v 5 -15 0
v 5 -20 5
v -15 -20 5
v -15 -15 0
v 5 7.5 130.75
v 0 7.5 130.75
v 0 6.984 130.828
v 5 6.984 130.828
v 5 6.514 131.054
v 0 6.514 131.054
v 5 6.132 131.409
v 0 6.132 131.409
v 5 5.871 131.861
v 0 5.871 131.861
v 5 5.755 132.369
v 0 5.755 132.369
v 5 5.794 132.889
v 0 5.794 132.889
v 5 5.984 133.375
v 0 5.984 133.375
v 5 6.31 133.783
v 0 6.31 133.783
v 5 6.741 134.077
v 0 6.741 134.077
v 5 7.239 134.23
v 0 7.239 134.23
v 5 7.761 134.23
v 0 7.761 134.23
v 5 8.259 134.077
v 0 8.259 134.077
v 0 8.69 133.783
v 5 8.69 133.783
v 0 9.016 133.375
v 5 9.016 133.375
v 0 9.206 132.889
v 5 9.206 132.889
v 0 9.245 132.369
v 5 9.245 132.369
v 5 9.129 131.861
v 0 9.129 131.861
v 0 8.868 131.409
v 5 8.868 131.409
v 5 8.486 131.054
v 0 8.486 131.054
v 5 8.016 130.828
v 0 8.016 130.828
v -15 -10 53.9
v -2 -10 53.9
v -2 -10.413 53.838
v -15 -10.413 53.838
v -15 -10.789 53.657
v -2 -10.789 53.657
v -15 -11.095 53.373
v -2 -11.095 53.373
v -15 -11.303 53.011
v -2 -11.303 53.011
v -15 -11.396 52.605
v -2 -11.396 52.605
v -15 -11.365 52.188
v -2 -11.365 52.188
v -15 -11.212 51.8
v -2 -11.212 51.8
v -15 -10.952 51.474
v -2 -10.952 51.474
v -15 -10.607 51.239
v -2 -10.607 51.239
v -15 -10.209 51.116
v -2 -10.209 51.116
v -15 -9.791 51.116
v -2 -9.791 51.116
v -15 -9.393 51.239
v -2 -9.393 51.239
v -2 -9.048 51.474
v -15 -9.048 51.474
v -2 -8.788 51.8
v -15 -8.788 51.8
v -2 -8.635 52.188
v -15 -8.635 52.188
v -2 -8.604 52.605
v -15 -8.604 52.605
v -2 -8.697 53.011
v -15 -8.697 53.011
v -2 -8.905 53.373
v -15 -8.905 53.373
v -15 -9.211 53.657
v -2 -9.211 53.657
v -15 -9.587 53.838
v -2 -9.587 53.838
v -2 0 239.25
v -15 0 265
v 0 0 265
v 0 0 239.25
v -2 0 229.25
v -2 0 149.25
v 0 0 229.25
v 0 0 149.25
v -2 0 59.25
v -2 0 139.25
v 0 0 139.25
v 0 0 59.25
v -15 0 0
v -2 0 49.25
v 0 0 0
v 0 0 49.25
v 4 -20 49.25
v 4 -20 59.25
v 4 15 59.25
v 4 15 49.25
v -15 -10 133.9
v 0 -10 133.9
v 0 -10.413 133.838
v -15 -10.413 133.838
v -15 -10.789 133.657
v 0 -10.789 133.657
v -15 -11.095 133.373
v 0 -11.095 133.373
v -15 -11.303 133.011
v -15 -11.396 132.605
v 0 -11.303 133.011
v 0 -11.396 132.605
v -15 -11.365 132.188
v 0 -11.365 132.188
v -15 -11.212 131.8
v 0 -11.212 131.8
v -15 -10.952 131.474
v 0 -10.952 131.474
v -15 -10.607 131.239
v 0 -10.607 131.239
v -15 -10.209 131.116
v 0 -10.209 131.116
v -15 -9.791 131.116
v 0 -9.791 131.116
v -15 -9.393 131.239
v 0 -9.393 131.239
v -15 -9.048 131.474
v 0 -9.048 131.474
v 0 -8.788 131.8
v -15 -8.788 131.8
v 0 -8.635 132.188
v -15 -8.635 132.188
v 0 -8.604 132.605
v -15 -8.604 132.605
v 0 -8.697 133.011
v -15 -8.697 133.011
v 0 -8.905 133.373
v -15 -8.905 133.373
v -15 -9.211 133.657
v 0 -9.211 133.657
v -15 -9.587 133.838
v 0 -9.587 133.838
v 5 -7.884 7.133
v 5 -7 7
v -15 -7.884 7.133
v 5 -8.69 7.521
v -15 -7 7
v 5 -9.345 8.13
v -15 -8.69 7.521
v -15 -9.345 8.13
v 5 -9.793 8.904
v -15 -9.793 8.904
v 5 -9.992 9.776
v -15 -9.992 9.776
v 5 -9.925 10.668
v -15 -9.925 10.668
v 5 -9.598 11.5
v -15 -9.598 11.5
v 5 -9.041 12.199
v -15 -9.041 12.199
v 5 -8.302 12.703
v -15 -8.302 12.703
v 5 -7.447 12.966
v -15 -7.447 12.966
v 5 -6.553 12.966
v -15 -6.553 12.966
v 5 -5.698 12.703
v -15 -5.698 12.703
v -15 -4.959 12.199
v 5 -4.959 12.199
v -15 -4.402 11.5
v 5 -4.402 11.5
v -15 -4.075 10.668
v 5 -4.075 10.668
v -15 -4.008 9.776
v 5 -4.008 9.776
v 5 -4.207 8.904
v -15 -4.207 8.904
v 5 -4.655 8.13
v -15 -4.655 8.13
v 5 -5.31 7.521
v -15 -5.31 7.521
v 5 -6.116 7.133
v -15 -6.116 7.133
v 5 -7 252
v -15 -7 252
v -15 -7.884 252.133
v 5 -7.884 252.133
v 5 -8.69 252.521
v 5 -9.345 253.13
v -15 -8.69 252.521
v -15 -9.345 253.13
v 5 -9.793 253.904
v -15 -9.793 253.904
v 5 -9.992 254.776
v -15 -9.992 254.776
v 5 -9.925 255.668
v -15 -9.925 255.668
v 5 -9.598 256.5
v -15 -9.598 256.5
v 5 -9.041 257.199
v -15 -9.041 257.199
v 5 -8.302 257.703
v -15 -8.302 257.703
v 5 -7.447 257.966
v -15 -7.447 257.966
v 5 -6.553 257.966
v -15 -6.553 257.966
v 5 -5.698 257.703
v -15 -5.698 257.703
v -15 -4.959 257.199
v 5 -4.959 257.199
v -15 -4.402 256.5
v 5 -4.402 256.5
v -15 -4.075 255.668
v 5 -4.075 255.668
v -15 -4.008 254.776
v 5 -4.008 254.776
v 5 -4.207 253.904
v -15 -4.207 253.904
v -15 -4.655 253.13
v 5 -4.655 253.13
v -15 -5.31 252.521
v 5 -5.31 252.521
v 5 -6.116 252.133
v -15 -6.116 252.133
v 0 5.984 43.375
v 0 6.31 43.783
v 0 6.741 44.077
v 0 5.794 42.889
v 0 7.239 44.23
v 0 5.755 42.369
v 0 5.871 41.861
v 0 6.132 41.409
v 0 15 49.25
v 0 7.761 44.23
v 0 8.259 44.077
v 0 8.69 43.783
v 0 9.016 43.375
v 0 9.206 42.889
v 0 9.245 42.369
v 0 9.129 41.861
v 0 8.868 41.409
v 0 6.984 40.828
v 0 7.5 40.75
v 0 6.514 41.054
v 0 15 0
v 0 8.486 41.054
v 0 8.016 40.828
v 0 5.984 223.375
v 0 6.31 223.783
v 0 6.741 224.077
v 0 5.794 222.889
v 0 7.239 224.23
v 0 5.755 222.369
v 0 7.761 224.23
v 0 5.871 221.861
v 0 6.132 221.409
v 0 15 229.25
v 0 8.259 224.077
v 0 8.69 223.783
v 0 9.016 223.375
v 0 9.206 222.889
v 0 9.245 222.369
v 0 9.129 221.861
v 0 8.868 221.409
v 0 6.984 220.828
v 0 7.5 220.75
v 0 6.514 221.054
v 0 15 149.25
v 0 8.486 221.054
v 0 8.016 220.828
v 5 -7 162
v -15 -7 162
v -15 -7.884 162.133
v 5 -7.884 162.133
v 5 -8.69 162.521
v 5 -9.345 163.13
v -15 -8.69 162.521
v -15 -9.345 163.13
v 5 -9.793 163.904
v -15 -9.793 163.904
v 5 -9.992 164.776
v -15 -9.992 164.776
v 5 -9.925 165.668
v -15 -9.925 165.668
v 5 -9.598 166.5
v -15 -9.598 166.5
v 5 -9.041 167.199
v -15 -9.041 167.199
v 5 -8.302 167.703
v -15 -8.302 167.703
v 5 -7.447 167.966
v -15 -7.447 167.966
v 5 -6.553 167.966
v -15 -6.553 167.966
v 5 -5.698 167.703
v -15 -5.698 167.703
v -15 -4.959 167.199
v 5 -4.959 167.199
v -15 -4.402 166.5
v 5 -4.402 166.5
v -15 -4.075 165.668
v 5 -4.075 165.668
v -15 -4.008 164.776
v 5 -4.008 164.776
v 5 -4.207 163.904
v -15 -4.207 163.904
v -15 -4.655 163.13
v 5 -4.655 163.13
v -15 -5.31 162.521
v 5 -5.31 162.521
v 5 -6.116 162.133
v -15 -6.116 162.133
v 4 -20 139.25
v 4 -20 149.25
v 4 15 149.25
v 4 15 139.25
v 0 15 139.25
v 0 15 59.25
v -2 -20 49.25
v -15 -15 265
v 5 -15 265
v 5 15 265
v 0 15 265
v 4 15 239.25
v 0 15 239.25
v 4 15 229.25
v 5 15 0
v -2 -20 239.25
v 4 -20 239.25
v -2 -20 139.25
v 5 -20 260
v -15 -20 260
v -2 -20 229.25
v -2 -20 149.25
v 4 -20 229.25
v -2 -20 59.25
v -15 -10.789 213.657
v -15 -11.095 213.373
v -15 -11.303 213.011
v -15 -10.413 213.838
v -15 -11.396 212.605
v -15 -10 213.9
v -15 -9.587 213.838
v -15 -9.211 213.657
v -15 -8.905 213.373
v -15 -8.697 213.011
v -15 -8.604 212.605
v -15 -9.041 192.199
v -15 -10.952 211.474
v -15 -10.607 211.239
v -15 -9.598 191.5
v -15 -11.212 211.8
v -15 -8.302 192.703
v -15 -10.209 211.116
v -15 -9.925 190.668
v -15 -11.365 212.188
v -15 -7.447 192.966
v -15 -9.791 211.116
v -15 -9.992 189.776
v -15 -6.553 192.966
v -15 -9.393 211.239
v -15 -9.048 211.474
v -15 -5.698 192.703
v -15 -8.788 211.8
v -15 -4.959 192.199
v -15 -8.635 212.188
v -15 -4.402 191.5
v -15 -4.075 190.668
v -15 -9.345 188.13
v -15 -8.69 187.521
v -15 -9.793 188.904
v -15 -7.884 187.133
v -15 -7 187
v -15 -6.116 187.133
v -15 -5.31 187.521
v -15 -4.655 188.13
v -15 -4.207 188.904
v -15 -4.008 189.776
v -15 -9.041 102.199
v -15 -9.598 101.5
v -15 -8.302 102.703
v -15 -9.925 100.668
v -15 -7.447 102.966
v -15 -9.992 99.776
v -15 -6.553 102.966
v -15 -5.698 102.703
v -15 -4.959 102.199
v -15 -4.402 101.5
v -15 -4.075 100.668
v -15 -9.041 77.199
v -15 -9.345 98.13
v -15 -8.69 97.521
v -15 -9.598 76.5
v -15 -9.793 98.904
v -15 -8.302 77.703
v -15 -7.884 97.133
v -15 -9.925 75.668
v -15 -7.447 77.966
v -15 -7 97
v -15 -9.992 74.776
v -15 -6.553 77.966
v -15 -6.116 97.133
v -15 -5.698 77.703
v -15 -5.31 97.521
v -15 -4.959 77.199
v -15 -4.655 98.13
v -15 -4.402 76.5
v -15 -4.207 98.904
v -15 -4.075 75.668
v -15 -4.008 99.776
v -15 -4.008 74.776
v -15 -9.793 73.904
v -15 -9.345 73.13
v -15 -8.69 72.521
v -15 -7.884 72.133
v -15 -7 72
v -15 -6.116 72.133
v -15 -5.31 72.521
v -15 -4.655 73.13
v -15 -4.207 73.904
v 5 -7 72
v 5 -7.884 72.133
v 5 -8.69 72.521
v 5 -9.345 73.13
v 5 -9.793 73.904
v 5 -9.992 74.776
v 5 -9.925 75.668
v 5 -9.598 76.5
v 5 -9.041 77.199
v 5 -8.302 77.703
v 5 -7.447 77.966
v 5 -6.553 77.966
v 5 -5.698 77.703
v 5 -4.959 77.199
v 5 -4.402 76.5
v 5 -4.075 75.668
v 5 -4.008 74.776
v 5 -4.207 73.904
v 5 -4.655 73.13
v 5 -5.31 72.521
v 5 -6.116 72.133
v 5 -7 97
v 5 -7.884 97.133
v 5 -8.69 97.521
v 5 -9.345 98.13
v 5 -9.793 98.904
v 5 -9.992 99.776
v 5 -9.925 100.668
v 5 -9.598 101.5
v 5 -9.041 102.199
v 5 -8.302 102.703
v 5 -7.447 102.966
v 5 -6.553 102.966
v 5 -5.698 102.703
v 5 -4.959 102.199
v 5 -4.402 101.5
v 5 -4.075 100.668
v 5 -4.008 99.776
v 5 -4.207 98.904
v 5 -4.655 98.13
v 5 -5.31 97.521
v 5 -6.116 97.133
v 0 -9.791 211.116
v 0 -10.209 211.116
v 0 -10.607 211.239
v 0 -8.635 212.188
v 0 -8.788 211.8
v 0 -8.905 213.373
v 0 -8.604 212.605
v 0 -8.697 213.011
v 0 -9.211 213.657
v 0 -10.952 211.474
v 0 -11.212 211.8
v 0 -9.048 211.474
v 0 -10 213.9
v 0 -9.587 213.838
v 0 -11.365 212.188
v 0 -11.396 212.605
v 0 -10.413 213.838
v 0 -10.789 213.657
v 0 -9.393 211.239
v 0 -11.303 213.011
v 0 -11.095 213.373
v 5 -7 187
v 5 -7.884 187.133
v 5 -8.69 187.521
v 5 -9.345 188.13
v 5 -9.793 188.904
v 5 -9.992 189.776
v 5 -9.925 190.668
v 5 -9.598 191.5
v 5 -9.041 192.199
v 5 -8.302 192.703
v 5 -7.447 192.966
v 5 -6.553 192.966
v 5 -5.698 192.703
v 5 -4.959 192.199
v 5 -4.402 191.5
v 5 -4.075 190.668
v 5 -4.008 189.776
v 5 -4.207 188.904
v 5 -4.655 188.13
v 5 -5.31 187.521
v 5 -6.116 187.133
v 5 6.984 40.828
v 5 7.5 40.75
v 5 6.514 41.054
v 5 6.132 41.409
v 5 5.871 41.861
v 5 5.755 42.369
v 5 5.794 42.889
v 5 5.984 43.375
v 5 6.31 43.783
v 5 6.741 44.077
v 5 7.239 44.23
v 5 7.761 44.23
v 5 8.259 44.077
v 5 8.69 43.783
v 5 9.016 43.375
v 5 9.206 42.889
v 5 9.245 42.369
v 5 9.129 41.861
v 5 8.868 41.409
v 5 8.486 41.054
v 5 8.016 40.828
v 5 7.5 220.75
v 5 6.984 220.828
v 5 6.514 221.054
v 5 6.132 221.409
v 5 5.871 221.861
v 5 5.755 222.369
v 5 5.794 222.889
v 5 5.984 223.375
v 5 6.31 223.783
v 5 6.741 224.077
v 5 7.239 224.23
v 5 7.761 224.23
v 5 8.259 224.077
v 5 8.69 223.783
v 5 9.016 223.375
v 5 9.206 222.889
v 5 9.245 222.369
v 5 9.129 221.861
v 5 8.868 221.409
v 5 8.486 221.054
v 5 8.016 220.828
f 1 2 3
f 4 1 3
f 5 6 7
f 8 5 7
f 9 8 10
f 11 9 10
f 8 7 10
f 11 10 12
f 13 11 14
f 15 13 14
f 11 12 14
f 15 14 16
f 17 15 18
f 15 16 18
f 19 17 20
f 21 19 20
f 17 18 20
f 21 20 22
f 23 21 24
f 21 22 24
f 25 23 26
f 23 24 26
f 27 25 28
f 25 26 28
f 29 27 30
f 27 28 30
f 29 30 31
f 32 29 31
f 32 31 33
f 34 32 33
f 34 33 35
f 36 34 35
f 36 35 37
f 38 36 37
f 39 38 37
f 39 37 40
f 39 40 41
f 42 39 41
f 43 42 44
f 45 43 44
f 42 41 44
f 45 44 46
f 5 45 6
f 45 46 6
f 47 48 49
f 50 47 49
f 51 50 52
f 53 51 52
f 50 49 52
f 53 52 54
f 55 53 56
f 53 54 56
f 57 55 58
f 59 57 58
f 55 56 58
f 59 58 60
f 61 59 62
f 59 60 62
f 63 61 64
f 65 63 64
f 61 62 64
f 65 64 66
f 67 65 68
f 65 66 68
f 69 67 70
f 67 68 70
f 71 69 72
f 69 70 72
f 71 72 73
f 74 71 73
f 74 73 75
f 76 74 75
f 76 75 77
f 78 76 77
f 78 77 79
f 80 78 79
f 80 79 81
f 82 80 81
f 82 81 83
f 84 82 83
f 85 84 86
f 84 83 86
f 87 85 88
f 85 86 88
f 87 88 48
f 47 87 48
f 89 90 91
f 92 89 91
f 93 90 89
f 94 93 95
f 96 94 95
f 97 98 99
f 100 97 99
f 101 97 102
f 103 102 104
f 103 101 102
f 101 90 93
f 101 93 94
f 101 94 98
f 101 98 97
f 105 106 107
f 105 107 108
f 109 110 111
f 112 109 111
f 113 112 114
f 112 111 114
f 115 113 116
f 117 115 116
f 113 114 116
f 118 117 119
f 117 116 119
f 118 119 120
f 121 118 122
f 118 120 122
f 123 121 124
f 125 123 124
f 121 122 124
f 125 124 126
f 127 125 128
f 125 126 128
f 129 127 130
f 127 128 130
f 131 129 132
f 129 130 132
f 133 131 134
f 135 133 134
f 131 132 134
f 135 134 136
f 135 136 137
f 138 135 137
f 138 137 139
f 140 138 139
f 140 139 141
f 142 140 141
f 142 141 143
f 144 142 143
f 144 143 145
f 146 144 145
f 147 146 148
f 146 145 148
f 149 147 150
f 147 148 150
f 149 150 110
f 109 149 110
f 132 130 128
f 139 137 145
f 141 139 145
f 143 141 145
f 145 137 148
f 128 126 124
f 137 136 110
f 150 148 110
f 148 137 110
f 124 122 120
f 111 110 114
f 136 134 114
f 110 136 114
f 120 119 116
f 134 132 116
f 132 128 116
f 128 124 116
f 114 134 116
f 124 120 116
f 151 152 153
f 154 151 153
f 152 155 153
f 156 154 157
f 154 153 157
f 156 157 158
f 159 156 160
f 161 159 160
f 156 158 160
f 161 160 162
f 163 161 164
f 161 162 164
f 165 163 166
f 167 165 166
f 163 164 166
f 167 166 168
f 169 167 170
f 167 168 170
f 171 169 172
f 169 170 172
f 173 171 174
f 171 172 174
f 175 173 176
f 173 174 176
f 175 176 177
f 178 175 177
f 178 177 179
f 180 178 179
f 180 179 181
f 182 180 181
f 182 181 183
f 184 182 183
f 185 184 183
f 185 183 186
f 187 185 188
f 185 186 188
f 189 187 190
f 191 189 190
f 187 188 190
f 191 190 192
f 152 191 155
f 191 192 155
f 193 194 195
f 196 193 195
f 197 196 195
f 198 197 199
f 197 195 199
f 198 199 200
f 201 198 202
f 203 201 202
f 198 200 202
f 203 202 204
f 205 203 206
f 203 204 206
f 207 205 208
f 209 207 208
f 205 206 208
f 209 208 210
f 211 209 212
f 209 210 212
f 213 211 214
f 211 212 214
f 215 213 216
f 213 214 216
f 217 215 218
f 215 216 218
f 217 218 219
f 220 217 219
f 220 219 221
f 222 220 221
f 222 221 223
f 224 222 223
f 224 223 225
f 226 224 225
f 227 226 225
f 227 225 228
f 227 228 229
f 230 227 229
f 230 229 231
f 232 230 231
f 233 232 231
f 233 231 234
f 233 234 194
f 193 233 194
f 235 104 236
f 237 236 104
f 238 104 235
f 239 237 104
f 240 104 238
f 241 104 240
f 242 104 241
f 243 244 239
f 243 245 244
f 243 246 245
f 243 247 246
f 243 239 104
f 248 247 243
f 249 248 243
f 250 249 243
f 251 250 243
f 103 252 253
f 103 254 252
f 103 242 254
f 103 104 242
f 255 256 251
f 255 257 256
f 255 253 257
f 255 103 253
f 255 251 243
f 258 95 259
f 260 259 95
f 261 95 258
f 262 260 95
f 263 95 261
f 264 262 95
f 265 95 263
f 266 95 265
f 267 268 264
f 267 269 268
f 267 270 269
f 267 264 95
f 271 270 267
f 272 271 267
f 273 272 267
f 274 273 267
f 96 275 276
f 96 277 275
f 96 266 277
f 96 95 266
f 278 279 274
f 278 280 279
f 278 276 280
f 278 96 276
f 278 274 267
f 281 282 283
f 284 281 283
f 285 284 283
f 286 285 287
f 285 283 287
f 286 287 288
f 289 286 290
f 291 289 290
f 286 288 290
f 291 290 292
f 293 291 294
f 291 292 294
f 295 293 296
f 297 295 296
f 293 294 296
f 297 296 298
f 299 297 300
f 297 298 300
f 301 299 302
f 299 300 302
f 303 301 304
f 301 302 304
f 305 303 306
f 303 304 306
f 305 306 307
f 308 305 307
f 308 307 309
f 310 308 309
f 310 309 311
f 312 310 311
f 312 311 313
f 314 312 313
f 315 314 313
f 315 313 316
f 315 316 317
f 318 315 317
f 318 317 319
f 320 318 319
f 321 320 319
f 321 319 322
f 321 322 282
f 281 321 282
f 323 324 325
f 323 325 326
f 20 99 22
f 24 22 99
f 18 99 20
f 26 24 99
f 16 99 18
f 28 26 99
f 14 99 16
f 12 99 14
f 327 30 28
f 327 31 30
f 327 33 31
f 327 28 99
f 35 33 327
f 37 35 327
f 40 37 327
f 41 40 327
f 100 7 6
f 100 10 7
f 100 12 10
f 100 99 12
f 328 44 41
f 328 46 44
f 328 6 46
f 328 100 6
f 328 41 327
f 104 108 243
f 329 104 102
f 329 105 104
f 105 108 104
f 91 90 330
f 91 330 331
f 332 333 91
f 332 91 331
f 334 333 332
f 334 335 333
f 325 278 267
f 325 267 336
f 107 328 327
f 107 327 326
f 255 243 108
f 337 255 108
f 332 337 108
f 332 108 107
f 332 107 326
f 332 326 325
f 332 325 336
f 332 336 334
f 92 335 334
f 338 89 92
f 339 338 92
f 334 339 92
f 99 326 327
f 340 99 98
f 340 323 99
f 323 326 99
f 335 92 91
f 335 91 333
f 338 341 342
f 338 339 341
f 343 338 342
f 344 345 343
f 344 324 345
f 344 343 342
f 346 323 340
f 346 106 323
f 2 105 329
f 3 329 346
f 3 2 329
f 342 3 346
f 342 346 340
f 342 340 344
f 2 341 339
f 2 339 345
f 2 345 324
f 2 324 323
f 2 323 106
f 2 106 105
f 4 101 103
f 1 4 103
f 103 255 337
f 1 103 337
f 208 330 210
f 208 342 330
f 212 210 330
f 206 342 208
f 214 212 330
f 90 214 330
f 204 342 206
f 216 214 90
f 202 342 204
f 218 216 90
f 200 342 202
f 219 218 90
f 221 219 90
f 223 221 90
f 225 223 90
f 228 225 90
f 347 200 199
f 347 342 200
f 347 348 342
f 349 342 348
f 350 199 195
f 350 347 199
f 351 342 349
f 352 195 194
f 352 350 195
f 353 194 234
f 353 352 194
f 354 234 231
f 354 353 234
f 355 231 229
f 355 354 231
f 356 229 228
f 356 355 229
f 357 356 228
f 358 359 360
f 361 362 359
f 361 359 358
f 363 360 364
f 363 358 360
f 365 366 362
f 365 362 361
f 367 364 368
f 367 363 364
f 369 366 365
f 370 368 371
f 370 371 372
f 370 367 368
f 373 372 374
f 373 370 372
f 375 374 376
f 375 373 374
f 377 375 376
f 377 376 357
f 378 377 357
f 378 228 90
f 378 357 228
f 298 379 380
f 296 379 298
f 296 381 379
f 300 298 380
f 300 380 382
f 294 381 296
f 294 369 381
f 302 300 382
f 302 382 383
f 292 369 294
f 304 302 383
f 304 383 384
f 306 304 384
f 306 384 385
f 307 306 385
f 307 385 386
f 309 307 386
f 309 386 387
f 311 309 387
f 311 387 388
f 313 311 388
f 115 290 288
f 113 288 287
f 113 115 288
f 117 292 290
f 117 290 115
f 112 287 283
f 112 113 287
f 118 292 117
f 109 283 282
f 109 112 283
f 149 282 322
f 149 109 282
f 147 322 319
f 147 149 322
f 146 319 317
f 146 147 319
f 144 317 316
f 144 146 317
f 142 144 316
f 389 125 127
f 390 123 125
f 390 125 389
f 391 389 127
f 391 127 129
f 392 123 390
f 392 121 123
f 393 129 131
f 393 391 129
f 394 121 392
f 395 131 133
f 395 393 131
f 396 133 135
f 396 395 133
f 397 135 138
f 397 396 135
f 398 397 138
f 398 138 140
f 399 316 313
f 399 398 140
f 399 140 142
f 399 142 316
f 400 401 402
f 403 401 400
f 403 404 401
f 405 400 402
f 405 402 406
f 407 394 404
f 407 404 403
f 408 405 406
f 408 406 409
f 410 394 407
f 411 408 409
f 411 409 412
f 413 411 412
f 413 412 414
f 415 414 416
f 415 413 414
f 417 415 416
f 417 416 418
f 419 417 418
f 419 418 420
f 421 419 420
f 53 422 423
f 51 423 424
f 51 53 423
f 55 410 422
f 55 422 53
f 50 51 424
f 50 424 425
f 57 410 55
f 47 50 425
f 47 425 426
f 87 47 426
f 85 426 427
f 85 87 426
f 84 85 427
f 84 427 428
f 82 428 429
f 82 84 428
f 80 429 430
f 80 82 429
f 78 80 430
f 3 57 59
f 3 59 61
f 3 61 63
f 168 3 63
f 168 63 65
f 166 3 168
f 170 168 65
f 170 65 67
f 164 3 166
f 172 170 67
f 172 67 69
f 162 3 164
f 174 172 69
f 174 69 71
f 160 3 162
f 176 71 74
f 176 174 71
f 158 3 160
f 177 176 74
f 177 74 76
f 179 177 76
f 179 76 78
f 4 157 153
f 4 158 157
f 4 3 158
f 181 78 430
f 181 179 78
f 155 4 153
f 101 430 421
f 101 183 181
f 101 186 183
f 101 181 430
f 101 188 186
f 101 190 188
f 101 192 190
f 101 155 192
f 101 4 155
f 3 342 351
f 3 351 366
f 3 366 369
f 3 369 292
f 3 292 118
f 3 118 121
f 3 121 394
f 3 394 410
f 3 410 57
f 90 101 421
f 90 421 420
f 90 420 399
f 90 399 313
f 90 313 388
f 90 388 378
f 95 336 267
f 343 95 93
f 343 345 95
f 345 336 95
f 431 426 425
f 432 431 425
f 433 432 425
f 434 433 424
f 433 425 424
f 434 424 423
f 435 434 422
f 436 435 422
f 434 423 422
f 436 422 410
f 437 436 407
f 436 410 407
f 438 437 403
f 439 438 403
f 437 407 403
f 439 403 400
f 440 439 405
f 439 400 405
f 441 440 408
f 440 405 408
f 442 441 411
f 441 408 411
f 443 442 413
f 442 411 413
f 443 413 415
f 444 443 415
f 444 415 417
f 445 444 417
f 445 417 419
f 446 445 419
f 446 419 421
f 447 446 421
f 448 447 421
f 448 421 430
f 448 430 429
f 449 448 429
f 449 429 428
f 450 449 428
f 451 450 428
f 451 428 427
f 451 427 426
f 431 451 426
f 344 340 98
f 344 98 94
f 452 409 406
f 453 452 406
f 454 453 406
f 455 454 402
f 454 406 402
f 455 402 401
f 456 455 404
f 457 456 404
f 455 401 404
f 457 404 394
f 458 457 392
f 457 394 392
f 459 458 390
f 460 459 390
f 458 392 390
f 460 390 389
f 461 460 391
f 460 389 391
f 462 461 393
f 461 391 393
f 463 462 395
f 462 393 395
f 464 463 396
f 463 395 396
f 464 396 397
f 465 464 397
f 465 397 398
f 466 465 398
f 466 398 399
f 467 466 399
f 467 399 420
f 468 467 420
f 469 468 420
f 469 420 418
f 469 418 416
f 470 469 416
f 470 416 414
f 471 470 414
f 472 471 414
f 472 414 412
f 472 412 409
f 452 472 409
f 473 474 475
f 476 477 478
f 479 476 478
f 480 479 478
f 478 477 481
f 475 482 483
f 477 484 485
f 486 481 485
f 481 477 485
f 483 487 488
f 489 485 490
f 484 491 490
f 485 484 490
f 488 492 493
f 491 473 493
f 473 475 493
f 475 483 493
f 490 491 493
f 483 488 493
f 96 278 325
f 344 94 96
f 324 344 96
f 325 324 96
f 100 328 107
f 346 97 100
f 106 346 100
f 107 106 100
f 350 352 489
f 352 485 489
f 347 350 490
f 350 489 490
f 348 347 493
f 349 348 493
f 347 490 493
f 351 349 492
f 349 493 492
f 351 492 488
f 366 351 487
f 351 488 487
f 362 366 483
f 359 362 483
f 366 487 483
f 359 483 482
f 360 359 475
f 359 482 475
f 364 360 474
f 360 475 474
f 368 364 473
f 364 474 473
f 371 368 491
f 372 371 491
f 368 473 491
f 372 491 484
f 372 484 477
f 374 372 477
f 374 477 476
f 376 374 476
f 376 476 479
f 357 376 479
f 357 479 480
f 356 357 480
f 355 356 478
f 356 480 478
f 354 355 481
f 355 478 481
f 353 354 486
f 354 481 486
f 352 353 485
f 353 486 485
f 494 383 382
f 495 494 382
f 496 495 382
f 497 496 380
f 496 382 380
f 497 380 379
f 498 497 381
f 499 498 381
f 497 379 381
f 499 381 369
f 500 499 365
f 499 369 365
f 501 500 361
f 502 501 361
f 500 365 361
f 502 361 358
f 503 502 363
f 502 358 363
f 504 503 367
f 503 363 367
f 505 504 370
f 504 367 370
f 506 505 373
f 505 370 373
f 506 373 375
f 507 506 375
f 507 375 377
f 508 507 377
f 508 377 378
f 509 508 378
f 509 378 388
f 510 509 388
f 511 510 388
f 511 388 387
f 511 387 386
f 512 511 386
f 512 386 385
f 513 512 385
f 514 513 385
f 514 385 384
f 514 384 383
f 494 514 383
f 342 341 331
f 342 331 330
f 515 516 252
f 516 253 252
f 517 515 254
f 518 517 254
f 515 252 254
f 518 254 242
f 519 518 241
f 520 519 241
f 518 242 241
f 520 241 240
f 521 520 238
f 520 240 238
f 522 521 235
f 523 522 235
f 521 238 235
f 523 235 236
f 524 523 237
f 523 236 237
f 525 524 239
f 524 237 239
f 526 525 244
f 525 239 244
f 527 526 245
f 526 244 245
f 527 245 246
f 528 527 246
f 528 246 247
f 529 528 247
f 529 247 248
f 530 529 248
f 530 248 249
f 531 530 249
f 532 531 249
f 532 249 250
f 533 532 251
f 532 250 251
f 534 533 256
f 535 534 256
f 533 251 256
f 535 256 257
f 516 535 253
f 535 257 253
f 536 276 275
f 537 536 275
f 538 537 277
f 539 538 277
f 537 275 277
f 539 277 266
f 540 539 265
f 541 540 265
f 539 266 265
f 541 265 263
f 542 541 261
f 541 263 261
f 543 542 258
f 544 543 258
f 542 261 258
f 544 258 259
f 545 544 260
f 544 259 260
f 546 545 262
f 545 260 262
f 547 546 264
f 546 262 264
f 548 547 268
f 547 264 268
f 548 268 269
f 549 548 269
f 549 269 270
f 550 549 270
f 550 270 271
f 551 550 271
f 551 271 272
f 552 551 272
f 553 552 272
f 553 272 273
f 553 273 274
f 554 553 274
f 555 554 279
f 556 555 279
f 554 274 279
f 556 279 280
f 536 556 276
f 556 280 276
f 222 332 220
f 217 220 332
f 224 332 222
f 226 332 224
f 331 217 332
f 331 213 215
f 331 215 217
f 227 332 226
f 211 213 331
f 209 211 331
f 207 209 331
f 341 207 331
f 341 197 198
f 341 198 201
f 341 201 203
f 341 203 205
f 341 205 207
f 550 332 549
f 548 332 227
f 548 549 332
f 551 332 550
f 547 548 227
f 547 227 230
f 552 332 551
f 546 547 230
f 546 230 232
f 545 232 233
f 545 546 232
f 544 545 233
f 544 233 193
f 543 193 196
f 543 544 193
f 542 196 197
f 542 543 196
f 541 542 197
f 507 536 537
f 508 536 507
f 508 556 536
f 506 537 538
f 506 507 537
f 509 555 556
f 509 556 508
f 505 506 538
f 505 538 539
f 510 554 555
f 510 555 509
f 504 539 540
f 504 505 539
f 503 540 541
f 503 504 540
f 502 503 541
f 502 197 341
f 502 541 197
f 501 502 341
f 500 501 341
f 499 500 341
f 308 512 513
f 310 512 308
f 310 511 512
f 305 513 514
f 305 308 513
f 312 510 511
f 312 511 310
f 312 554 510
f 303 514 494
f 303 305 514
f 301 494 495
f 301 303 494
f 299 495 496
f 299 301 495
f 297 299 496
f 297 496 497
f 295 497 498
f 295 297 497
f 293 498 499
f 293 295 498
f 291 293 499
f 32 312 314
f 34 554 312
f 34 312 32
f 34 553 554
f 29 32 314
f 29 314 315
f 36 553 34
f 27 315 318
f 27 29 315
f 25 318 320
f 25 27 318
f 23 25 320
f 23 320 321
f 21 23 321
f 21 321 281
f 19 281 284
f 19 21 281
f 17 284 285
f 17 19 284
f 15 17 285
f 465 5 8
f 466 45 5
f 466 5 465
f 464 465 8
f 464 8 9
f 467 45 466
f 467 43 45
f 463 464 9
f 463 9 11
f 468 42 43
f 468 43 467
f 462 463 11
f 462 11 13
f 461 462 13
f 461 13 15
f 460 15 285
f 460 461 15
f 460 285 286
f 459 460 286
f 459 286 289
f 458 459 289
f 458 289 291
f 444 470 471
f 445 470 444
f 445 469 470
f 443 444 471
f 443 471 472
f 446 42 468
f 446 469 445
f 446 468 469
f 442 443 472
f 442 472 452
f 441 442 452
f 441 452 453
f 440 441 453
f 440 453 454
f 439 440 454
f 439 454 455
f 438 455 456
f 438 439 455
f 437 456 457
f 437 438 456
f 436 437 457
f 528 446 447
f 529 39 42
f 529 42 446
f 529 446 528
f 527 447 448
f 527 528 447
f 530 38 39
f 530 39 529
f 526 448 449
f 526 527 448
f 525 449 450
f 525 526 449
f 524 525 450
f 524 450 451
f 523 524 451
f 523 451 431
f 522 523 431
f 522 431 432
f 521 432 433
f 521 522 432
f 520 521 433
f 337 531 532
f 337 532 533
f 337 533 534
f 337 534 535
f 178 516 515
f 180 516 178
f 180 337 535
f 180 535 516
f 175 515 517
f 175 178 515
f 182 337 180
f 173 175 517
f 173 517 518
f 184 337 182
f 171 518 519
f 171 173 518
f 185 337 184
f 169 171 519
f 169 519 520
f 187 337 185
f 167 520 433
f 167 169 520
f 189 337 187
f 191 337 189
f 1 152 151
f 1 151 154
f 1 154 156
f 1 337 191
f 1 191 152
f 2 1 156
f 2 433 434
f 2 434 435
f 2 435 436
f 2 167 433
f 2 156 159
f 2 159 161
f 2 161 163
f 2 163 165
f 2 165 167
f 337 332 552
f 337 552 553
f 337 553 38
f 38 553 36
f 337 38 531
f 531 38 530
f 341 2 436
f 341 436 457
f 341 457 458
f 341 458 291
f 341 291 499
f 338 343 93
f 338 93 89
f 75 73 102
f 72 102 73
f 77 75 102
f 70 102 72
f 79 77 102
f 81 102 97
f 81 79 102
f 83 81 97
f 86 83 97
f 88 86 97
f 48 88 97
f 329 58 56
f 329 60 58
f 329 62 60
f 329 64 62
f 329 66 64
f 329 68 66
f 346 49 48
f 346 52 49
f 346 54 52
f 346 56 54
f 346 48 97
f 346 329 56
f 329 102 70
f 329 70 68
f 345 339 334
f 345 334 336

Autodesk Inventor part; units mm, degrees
ref_plane "YZ Plane" through (0, 0, 0) normal (1, 0, 0) x (0, 1, 0)
ref_plane "XZ Plane" through (0, 0, 0) normal (0, 1, 0) x (-1, 0, 0)
ref_plane "XY Plane" through (0, 0, 0) normal (0, 0, 1) x (1, 0, 0)
sketch "Sketch1" plane through (0, 0, 0) normal (0, 0, 1) x (1, 0, 0)
  line L0 (0, 0) -> (0, 15)
  line L1 (0, 15) -> (5, 15)
  line L2 (5, 15) -> (5, -20)
  line L3 (5, -20) -> (-15, -20)
  line L4 (-15, -20) -> (-15, 0)
  line L5 (-15, 0) -> (0, 0)
  dimension "d0" = 15
  dimension "d1" = 5
  dimension "d2" = 35
extrude "Extrusion1" add sketch "Sketch1" along normal blind 265
sketch "Sketch2" plane through (5, -20, 0) normal (1, 0, 0) x (0, 0, -1)
  line L0 (0, 0) -> (0, 35) projected
  line L1 (0, 35) -> (-265, 35) projected
  line L2 (-265, 0) -> (-265, 35) projected
  line L3 (0, 0) -> (-265, 0) projected
  point P0 (0, 20)
  point P1 (-222.5, 27.5)
  point P2 (-132.5, 27.5)
  point P3 (-42.5, 27.5)
  point P4 (-132.5, 35)
  dimension "d5" = 90
  dimension "d6" = 90
  dimension "d7" = 7.5
hole "Hole1" at (5, 7.5, 222.5) at (5, 7.5, 132.5) at (5, 7.5, 42.5) direction (-1, 0, 0) diameter 3.5 end through all
chamfer "Chamfer1" distance 5 angle 45 2 edges at (-5, -20, 265) (-5, -20, 0)
sketch "Sketch3" plane through (-15, 0, 0) normal (-1, 0, 0) x (0, 0, 1)
  line L0 (5, -20) -> (260, -20) projected
  line L1 (265, -15) -> (260, -20) projected
  line L2 (265, 0) -> (265, -15) projected
  line L3 (5, -20) -> (0, -15) projected
  line L4 (0, 0) -> (0, -15) projected
  line L5 (0, 0) -> (265, 0) projected
  point P0 (52.5, -10)
  point P1 (132.5, -10)
  point P2 (212.5, -10)
  point P3 (132.5, -20)
  dimension "d18" = 80
  dimension "d19" = 80
  dimension "d20" = 10
hole "Hole2" at (-15, -10, 52.5) at (-15, -10, 132.5) at (-15, -10, 212.5) direction (1, 0, 0) diameter 2.8 depth 15
sketch "Sketch4" plane through (5, 15, 265) normal (1, 0, 0) x (0, 0, -1)
  circle A0 centre (132.5, -7.5) radius 1.75 projected
  circle A1 centre (42.5, -7.5) radius 1.75 projected
  circle A2 centre (222.5, -7.5) radius 1.75 projected
  line L0 (265, -30) -> (260, -35) projected
  line L1 (265, -30) -> (265, 0) projected
  line L2 (265, 0) -> (0, 0) projected
  line L3 (0, -30) -> (0, 0) projected
  line L4 (5, -35) -> (0, -30) projected
  line L5 (260, -35) -> (5, -35) projected
  point P0 (265, -15)
  point P1 (10, -22)
  point P2 (75, -22)
  point P3 (100, -22)
  point P4 (165, -22)
  point P5 (255, -22)
  point P6 (190, -22)
  dimension "d28" = 10
  dimension "d29" = 22
  dimension "d30" = 65
  dimension "d31" = 25
  dimension "d32" = 65
  dimension "d33" = 65
  dimension "d34" = 25
  dimension "d43" = 10
hole "Hole3" at (5, -7, 255) at (5, -7, 190) at (5, -7, 165) at (5, -7, 100) at (5, -7, 10) at (5, -7, 75) direction (-1, 0, 0) diameter 6 end through all
sketch "Sketch5" plane through (-15, -20, 5) normal (0, -1, 0) x (1, 0, 0)
  line L0 (20, 0) -> (0, 0) projected
  line L1 (20, 0) -> (20, 255) projected
  line L2 (0, 255) -> (20, 255) projected
  line L3 (0, 0) -> (0, 255) projected
  line L4 (15, 35.75) -> (15, 39.25) projected
  line L5 (20, 39.25) -> (20, 35.75) projected
  line L6 (15, 125.75) -> (15, 129.25) projected
  line L7 (20, 129.25) -> (20, 125.75) projected
  line L8 (15, 215.75) -> (15, 219.25) projected
  line L9 (20, 219.25) -> (20, 215.75) projected
  line L10 (19, 224.25) -> (13, 224.25)
  line L11 (13, 224.25) -> (13, 234.25)
  line L12 (13, 234.25) -> (19, 234.25)
  line L13 (19, 234.25) -> (19, 224.25)
  line L14 (19, 134.25) -> (13, 134.25)
  line L15 (13, 134.25) -> (13, 144.25)
  line L16 (13, 144.25) -> (19, 144.25)
  line L17 (19, 144.25) -> (19, 134.25)
  line L18 (19, 44.25) -> (13, 44.25)
  line L19 (13, 44.25) -> (13, 54.25)
  line L20 (13, 54.25) -> (19, 54.25)
  line L21 (19, 54.25) -> (19, 44.25)
  point P0 (15, -5)
  dimension "d44" = 1
  dimension "d45" = 5
  dimension "d46" = 5
  dimension "d47" = 5
  dimension "d48" = 10
  dimension "d49" = 6
extrude "Extrusion2" cut sketch "Sketch5" against normal through all contours L10 L11 L12 L13 | L14 L15 L16 L17 | L18 L19 L20 L21
equation "\"d6\" = d5"
equation "\"d19\" = d18"
equation "\"d32\" = d30"
equation "\"d33\" = d32"
equation "\"d34\" = d31"
equation "\"d46\" = d45"
equation "\"d47\" = d45"
properties part number "Toolhead Dock Assembly" material "ABS Plastic"
